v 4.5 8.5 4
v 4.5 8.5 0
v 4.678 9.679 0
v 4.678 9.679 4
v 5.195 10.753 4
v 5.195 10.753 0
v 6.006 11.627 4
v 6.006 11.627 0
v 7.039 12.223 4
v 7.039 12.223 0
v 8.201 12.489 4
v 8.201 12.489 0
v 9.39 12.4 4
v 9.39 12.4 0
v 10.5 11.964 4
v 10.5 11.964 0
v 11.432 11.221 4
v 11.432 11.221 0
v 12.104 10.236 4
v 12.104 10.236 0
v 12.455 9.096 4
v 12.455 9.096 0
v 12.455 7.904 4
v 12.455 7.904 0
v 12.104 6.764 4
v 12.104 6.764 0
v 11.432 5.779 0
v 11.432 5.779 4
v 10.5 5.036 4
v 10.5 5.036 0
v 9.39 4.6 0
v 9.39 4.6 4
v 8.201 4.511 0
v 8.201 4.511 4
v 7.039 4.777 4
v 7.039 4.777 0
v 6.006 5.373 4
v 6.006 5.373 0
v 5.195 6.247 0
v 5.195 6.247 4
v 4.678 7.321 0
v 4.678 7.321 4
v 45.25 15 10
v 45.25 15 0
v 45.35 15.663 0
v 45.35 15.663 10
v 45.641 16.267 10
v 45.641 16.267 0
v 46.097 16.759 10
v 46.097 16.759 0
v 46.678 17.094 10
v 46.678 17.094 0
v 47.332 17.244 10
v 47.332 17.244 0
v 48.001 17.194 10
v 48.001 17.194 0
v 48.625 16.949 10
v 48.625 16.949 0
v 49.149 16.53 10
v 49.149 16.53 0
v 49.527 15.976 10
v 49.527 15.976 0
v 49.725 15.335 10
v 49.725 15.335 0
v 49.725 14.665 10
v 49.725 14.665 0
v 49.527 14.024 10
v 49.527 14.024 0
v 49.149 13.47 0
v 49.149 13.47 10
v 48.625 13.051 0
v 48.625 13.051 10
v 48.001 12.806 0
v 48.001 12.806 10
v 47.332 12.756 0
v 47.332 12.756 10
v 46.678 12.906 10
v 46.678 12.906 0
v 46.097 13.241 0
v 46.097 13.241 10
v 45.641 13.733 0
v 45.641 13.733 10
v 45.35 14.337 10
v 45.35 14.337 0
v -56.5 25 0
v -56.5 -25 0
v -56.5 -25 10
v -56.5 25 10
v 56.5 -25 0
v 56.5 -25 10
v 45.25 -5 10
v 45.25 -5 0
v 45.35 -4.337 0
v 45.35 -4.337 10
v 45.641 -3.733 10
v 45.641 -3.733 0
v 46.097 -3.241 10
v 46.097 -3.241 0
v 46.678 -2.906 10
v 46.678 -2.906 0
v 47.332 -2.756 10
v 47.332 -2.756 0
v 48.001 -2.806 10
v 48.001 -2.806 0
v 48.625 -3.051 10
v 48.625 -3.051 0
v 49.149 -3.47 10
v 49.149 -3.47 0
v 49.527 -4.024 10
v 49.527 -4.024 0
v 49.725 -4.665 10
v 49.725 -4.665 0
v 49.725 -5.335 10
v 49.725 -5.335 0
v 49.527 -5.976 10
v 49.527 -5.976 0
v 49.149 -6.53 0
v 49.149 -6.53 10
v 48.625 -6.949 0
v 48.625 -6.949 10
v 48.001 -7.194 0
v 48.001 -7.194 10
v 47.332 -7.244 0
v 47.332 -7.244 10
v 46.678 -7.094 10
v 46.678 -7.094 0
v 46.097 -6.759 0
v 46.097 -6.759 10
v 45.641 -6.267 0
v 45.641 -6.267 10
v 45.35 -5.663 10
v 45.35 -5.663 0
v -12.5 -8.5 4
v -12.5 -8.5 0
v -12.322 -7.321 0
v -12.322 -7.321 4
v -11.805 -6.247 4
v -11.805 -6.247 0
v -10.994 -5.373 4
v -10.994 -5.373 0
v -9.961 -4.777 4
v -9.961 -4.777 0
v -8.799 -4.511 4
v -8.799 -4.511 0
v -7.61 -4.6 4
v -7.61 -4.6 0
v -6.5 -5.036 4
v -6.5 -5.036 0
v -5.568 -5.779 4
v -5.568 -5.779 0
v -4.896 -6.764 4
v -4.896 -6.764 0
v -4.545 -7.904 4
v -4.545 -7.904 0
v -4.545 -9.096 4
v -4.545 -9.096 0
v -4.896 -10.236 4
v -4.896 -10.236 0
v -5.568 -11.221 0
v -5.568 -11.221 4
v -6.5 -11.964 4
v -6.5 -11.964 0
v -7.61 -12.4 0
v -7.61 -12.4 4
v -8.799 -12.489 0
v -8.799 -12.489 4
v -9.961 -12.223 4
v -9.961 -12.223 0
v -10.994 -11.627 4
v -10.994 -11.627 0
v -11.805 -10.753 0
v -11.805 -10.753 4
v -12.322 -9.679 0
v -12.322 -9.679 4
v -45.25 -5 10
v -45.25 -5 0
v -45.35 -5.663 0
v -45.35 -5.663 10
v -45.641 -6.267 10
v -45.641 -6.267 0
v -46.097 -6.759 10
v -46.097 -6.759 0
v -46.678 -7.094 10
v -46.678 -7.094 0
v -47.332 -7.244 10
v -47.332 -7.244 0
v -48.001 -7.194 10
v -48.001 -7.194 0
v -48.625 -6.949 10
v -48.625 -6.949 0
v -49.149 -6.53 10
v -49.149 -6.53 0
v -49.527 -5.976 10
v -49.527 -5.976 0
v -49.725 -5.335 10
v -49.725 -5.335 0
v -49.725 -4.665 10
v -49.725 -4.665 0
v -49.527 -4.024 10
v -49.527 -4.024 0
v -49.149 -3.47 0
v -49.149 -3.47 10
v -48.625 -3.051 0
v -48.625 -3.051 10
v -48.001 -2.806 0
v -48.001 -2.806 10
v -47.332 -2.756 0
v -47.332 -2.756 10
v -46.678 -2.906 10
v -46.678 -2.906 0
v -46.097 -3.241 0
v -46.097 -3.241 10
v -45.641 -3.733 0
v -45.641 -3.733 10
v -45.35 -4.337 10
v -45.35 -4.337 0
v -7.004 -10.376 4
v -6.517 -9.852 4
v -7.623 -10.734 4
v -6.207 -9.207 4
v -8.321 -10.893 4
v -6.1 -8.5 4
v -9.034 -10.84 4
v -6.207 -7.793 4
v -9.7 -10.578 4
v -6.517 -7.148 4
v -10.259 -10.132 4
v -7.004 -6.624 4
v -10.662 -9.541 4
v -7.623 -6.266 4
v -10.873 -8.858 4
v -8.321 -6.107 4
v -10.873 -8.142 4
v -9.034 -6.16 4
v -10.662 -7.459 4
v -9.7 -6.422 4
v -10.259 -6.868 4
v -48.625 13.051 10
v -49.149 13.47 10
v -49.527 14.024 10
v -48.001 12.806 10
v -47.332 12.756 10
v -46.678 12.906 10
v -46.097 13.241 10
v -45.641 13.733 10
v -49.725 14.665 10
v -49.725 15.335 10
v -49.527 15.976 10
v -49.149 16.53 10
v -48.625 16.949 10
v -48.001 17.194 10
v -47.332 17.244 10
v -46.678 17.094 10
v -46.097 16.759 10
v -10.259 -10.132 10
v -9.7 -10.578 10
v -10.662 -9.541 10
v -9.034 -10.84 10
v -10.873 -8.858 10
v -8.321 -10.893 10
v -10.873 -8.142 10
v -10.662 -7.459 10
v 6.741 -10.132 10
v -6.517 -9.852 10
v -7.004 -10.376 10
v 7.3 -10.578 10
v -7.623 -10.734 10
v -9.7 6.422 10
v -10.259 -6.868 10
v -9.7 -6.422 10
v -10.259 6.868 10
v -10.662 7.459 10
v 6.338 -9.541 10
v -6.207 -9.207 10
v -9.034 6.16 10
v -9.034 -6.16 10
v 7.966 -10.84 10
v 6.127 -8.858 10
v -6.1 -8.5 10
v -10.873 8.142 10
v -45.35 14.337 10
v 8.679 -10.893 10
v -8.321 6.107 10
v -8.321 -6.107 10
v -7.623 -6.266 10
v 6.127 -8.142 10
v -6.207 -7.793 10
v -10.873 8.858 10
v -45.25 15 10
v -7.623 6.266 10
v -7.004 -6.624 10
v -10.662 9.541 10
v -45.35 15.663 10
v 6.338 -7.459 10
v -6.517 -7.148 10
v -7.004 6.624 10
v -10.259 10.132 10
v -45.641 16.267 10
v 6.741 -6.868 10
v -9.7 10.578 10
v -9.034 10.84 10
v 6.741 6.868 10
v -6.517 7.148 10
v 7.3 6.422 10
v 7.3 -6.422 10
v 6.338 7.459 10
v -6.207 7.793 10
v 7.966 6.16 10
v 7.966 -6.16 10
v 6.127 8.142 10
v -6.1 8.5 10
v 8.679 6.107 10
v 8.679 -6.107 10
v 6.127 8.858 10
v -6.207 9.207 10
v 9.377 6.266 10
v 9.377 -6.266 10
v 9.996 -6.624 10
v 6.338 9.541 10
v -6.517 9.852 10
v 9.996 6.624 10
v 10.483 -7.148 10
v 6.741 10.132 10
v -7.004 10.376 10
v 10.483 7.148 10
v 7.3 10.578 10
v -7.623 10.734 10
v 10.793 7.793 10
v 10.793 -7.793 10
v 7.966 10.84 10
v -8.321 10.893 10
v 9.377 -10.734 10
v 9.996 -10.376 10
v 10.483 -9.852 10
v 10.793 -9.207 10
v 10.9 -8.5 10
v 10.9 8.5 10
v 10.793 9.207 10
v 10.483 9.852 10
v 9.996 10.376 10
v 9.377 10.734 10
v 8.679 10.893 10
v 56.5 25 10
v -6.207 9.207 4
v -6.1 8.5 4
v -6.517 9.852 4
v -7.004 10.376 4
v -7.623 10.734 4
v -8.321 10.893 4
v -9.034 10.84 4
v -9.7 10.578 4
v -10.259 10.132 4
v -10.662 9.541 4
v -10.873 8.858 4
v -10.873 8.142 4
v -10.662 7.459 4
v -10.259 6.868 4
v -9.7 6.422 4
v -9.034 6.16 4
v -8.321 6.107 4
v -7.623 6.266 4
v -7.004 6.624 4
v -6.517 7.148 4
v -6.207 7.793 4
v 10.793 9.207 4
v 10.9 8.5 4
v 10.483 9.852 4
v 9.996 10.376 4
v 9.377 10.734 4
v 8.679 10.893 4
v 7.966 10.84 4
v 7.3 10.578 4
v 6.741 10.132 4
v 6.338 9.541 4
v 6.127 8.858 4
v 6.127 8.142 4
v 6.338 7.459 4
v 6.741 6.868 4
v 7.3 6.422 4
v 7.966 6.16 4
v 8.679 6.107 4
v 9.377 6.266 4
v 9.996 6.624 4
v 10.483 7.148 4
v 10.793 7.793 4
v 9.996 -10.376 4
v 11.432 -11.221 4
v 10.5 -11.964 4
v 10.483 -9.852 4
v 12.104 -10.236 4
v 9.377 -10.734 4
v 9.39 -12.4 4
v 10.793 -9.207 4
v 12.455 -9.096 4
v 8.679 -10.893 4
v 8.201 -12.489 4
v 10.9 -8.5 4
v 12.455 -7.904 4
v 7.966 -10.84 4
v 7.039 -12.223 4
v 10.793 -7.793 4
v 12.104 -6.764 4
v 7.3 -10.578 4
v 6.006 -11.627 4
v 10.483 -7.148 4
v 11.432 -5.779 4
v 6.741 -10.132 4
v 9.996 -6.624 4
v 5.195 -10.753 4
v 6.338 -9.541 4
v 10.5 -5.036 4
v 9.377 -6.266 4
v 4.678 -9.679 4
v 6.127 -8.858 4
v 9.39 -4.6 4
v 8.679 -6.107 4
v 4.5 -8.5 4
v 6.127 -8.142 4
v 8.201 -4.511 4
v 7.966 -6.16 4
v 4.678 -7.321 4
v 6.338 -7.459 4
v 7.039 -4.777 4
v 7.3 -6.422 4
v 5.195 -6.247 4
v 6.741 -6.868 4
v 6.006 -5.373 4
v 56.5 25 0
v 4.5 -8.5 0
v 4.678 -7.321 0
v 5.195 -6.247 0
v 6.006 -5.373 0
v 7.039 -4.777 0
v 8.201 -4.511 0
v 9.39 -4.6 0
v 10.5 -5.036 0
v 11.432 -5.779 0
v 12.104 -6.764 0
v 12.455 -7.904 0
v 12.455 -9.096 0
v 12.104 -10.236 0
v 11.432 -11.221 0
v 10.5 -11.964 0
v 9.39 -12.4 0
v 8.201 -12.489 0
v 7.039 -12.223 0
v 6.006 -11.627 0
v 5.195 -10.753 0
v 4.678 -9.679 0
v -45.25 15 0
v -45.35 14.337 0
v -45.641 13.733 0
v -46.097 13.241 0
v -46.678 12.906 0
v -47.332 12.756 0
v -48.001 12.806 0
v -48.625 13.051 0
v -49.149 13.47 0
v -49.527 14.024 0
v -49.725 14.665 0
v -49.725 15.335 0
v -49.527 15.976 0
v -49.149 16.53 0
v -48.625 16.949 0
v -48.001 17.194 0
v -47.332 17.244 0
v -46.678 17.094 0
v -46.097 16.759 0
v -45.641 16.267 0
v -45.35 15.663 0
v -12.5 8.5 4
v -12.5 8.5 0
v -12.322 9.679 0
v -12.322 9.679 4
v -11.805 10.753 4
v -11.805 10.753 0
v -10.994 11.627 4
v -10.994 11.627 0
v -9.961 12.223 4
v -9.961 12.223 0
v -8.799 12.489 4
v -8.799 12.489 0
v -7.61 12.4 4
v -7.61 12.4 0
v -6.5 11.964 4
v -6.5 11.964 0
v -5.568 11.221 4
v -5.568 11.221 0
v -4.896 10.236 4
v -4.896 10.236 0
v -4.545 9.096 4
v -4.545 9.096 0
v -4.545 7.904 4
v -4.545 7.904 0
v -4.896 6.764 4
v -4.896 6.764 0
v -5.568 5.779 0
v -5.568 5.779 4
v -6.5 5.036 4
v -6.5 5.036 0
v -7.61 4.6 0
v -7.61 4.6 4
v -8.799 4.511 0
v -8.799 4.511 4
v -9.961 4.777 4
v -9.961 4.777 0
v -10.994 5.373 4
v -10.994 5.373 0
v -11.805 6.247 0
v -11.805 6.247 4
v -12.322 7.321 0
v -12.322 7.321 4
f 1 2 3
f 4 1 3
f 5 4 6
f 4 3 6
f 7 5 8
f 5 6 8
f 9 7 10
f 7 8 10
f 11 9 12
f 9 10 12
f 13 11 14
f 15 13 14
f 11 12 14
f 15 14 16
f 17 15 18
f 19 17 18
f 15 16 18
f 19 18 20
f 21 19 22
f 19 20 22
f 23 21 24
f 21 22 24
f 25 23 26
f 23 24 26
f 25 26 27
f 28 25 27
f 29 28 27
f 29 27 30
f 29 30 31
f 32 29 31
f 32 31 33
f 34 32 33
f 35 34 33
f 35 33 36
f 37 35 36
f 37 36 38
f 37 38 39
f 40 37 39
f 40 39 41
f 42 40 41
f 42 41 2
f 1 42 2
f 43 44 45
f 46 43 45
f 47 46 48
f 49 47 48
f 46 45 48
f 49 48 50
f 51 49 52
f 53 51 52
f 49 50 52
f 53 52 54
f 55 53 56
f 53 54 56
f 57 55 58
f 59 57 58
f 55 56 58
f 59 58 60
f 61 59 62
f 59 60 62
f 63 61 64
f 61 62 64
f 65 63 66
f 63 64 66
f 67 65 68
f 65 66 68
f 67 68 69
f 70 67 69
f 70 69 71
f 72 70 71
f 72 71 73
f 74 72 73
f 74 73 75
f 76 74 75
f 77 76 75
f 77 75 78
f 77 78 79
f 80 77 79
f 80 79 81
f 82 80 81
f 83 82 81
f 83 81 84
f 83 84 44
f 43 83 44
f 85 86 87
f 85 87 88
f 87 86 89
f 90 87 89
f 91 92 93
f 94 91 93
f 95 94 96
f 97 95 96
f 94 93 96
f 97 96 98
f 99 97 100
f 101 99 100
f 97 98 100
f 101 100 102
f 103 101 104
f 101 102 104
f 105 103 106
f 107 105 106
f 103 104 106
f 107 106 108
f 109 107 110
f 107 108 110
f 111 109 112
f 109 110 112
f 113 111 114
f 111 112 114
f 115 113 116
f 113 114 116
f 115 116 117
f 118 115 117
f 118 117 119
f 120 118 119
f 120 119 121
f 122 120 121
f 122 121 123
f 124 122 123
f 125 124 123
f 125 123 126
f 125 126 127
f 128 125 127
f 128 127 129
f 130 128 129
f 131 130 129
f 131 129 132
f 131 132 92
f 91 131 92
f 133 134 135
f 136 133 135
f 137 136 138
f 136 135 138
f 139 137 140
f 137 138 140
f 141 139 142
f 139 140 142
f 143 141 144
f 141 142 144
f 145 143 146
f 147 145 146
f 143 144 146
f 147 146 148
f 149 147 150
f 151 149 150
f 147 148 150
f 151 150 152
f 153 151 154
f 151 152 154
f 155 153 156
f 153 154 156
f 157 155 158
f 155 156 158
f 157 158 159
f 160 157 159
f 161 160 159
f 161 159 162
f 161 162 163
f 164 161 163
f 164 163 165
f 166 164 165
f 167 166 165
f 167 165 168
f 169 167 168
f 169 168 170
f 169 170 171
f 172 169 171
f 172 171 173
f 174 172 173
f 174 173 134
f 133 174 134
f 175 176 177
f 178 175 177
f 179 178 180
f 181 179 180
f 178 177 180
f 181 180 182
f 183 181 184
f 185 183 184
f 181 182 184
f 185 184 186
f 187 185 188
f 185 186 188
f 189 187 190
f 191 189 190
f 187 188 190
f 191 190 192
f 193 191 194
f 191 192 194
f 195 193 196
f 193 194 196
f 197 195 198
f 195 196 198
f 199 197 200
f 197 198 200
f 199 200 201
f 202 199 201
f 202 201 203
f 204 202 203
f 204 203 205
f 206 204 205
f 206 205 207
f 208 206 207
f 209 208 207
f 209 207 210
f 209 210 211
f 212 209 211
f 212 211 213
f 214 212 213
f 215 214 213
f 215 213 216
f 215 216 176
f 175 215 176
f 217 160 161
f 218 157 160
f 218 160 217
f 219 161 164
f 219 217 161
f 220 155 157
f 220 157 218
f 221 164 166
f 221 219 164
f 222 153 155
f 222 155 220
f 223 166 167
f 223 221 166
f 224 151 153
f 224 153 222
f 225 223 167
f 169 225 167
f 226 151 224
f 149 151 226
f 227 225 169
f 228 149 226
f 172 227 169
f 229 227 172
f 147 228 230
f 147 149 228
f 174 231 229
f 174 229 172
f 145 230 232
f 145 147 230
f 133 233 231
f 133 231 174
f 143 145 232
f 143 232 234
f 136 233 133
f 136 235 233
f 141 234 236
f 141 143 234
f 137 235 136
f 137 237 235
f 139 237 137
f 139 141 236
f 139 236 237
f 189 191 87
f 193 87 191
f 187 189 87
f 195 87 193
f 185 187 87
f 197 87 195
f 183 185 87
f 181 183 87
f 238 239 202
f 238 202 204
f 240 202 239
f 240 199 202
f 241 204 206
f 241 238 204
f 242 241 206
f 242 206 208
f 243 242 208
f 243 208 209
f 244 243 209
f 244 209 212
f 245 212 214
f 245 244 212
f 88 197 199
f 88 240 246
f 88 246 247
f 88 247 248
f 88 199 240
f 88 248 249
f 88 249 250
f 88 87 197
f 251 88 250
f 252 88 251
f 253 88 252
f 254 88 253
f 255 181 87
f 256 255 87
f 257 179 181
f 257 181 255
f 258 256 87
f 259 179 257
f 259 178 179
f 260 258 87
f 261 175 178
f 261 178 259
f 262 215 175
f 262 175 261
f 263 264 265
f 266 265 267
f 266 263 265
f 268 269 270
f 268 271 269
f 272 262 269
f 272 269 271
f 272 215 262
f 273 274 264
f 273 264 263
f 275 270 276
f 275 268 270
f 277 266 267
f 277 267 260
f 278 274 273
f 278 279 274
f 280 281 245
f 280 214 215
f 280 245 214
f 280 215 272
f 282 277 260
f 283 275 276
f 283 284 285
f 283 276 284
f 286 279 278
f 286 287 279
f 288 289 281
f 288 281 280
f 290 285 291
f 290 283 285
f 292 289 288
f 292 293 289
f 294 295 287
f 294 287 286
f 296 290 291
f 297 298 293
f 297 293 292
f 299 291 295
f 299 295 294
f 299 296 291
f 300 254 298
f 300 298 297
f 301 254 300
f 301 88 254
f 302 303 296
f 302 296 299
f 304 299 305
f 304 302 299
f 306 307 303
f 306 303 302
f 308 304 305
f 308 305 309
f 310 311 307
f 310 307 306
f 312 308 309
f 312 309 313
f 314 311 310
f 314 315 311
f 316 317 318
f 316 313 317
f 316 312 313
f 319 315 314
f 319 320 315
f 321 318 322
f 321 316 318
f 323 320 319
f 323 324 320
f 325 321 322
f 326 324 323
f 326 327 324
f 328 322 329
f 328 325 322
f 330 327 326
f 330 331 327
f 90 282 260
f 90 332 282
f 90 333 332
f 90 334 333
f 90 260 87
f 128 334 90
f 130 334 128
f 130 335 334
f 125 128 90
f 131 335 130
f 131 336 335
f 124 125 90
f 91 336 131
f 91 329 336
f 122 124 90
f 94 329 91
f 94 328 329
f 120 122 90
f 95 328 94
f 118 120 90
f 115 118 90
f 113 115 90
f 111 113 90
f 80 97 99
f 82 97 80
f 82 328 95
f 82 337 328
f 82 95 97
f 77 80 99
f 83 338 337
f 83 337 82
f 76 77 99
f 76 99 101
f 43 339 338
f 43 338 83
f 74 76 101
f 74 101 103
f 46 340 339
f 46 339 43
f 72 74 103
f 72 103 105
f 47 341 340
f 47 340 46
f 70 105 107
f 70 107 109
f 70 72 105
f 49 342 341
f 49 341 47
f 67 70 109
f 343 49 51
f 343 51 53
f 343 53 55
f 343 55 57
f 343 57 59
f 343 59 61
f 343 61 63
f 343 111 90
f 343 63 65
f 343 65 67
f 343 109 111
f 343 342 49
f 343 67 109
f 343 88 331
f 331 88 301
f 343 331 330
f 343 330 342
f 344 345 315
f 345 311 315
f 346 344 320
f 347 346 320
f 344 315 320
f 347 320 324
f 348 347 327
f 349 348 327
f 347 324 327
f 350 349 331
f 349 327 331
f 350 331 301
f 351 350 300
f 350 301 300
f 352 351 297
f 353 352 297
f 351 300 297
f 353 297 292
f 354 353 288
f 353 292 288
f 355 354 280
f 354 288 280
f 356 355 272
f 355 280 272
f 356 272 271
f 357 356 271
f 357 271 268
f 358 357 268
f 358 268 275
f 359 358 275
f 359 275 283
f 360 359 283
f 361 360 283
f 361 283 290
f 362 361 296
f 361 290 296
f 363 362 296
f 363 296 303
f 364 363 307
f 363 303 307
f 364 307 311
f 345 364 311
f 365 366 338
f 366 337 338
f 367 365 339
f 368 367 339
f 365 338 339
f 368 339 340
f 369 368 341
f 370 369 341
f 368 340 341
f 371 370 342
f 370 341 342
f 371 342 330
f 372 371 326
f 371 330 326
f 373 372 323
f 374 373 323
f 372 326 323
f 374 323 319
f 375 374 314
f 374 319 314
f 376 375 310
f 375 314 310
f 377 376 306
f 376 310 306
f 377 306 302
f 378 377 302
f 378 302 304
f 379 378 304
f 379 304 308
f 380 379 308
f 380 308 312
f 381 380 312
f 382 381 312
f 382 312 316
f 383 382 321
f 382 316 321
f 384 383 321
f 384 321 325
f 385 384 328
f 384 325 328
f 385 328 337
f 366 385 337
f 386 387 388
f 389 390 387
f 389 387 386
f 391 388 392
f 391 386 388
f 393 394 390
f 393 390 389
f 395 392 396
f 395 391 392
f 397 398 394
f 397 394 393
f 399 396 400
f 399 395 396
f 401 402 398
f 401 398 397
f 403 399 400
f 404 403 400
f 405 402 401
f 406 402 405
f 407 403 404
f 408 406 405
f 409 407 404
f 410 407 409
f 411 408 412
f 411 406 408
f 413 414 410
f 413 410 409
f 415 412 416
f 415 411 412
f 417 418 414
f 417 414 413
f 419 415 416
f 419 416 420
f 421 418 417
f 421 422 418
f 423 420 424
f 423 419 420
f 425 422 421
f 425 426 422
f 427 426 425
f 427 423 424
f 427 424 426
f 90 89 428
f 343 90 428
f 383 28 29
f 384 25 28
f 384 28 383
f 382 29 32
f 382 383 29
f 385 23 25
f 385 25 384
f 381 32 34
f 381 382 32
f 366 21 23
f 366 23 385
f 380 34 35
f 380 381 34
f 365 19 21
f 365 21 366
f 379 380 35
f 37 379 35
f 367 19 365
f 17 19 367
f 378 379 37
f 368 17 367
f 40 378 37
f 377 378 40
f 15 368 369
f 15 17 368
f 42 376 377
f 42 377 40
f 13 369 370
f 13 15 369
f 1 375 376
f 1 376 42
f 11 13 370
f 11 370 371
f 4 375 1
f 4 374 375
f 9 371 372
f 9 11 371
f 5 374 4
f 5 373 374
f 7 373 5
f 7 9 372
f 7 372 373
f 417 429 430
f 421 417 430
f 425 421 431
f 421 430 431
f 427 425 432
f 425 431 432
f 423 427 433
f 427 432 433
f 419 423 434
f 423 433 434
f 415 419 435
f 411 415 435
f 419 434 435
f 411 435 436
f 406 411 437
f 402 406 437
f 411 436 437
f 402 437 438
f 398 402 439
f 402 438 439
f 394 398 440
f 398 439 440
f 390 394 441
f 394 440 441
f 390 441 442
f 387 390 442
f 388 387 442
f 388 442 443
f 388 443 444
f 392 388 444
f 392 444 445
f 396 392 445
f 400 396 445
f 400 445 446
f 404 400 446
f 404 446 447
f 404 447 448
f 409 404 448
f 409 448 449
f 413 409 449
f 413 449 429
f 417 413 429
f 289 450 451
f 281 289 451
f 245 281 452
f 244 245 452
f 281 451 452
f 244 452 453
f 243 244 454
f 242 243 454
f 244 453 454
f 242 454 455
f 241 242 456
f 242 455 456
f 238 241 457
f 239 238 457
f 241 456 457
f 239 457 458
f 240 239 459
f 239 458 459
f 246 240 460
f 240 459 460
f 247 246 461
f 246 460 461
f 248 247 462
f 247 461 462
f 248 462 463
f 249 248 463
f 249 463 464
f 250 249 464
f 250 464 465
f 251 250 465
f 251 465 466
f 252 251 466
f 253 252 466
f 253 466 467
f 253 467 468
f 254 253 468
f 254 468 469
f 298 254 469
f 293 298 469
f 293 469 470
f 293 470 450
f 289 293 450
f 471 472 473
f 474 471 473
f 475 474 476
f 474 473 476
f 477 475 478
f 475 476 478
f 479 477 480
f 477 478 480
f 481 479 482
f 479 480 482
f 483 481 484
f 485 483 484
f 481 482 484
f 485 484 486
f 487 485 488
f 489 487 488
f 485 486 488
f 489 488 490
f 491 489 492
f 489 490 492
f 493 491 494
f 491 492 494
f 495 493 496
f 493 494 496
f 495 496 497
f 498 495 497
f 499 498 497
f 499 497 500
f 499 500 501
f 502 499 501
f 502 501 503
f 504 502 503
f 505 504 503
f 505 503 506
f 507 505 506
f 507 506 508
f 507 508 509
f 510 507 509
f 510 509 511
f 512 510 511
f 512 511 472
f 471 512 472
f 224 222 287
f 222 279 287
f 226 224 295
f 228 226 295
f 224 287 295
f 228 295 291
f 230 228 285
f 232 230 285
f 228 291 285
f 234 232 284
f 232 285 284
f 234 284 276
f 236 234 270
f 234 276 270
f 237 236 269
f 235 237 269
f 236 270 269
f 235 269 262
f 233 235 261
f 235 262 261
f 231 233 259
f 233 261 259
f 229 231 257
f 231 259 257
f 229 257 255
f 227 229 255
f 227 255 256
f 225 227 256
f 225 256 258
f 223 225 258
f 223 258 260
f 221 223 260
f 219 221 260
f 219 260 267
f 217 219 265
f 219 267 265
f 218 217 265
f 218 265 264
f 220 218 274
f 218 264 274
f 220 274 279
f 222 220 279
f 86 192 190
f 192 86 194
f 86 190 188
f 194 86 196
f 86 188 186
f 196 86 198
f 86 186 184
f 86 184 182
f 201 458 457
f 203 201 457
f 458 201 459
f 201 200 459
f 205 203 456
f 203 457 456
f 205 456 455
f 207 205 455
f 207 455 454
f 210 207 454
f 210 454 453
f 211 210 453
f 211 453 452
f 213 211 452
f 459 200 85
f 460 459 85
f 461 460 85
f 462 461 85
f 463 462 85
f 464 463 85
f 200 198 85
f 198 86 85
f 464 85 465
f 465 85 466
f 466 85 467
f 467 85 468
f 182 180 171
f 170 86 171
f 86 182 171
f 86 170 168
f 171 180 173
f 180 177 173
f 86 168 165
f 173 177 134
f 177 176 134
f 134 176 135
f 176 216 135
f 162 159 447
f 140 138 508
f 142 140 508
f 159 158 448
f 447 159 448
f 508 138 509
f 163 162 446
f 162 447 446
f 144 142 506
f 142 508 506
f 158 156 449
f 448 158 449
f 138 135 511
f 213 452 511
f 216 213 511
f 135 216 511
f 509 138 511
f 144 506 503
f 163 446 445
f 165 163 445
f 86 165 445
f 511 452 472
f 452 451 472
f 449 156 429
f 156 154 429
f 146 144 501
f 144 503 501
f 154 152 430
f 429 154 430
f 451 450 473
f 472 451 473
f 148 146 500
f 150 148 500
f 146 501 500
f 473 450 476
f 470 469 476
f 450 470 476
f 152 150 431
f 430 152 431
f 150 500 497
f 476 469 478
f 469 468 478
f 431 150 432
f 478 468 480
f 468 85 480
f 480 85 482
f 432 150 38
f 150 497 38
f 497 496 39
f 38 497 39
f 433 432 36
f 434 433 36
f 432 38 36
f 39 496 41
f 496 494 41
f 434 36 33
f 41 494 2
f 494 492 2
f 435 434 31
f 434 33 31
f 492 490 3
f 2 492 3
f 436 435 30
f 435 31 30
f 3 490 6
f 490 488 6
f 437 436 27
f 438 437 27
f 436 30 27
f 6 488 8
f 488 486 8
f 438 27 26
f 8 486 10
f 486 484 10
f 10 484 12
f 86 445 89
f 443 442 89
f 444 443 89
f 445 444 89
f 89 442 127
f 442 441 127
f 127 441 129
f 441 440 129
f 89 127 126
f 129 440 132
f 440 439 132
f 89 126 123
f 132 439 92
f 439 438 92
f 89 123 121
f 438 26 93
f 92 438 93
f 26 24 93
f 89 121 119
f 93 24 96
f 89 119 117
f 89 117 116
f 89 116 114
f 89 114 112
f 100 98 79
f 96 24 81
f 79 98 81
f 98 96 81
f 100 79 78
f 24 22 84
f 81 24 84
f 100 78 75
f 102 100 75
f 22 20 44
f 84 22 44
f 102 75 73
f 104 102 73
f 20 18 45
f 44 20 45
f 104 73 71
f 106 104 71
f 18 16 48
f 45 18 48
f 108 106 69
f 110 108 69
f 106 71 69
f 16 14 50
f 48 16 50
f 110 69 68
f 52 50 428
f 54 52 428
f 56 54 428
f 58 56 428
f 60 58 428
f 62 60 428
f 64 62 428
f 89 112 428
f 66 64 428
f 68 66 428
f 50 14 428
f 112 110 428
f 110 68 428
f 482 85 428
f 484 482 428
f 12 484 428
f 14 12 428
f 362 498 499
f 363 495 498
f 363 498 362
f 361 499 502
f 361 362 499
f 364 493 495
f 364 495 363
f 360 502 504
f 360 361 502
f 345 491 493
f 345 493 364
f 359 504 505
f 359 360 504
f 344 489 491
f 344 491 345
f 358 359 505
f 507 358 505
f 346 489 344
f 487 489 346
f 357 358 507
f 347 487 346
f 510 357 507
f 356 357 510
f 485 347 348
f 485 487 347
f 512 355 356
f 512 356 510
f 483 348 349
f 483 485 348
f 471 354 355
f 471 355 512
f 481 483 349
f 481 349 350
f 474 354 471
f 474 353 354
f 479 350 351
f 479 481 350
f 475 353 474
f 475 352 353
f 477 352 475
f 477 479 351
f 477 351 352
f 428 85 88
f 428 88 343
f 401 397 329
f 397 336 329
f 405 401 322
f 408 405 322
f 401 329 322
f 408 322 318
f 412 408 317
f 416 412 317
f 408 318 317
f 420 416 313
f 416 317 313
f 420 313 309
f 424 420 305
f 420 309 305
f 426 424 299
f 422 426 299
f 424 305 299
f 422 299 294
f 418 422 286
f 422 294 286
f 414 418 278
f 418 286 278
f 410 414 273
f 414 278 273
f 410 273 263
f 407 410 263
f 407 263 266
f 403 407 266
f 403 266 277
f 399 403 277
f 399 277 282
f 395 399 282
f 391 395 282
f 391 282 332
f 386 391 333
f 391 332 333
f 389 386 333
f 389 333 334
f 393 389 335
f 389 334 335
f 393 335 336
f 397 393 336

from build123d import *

# Parameters (mm, degrees)
SKETCH1_W                      = 113
SKETCH1_H                      = 50
BOSS_EXTRUDE1_DEPTH            = 10
CBORE_FOR_M4_SHCS1_D           = 4.8
CBORE_FOR_M4_SHCS1_CBORE_D     = 8
CBORE_FOR_M4_SHCS1_CBORE_DEPTH = 4
SKETCH4_R                      = 2.25
CUT_EXTRUDE1_DEPTH             = 63.587938135


with BuildPart() as part:
    # Sketch1 → Boss-Extrude1 (new body)
    with BuildSketch(Plane.XY):
        Rectangle(SKETCH1_W, SKETCH1_H)
    extrude(amount=BOSS_EXTRUDE1_DEPTH)

    # CBORE for M4 SHCS1 (through all)
    with Locations(Plane(origin=(0, 0, 0), x_dir=(-1, 0, 0), z_dir=(0, 0, -1))):
        with Locations((-8.5, 8.5), (-8.5, -8.5), (8.5, -8.5), (8.5, 8.5)):
            CounterBoreHole(CBORE_FOR_M4_SHCS1_D / 2, CBORE_FOR_M4_SHCS1_CBORE_D / 2, CBORE_FOR_M4_SHCS1_CBORE_DEPTH)

    # Sketch4 → Cut-Extrude1 (cut, through all)
    with BuildSketch(Plane(origin=(0, 0, 0), x_dir=(-1, 0, 0), z_dir=(0, 0, -1))):
        with Locations((-47.5, 15)):
            Circle(SKETCH4_R)
        with Locations((-47.5, -5)):
            Circle(SKETCH4_R)
        with Locations(Location((47.5, -5, 0), (0, 0, 180))):
            Circle(SKETCH4_R)
        with Locations(Location((47.5, 15, 0), (0, 0, 180))):
            Circle(SKETCH4_R)
    extrude(amount=-CUT_EXTRUDE1_DEPTH, mode=Mode.SUBTRACT)


solid = part.part
